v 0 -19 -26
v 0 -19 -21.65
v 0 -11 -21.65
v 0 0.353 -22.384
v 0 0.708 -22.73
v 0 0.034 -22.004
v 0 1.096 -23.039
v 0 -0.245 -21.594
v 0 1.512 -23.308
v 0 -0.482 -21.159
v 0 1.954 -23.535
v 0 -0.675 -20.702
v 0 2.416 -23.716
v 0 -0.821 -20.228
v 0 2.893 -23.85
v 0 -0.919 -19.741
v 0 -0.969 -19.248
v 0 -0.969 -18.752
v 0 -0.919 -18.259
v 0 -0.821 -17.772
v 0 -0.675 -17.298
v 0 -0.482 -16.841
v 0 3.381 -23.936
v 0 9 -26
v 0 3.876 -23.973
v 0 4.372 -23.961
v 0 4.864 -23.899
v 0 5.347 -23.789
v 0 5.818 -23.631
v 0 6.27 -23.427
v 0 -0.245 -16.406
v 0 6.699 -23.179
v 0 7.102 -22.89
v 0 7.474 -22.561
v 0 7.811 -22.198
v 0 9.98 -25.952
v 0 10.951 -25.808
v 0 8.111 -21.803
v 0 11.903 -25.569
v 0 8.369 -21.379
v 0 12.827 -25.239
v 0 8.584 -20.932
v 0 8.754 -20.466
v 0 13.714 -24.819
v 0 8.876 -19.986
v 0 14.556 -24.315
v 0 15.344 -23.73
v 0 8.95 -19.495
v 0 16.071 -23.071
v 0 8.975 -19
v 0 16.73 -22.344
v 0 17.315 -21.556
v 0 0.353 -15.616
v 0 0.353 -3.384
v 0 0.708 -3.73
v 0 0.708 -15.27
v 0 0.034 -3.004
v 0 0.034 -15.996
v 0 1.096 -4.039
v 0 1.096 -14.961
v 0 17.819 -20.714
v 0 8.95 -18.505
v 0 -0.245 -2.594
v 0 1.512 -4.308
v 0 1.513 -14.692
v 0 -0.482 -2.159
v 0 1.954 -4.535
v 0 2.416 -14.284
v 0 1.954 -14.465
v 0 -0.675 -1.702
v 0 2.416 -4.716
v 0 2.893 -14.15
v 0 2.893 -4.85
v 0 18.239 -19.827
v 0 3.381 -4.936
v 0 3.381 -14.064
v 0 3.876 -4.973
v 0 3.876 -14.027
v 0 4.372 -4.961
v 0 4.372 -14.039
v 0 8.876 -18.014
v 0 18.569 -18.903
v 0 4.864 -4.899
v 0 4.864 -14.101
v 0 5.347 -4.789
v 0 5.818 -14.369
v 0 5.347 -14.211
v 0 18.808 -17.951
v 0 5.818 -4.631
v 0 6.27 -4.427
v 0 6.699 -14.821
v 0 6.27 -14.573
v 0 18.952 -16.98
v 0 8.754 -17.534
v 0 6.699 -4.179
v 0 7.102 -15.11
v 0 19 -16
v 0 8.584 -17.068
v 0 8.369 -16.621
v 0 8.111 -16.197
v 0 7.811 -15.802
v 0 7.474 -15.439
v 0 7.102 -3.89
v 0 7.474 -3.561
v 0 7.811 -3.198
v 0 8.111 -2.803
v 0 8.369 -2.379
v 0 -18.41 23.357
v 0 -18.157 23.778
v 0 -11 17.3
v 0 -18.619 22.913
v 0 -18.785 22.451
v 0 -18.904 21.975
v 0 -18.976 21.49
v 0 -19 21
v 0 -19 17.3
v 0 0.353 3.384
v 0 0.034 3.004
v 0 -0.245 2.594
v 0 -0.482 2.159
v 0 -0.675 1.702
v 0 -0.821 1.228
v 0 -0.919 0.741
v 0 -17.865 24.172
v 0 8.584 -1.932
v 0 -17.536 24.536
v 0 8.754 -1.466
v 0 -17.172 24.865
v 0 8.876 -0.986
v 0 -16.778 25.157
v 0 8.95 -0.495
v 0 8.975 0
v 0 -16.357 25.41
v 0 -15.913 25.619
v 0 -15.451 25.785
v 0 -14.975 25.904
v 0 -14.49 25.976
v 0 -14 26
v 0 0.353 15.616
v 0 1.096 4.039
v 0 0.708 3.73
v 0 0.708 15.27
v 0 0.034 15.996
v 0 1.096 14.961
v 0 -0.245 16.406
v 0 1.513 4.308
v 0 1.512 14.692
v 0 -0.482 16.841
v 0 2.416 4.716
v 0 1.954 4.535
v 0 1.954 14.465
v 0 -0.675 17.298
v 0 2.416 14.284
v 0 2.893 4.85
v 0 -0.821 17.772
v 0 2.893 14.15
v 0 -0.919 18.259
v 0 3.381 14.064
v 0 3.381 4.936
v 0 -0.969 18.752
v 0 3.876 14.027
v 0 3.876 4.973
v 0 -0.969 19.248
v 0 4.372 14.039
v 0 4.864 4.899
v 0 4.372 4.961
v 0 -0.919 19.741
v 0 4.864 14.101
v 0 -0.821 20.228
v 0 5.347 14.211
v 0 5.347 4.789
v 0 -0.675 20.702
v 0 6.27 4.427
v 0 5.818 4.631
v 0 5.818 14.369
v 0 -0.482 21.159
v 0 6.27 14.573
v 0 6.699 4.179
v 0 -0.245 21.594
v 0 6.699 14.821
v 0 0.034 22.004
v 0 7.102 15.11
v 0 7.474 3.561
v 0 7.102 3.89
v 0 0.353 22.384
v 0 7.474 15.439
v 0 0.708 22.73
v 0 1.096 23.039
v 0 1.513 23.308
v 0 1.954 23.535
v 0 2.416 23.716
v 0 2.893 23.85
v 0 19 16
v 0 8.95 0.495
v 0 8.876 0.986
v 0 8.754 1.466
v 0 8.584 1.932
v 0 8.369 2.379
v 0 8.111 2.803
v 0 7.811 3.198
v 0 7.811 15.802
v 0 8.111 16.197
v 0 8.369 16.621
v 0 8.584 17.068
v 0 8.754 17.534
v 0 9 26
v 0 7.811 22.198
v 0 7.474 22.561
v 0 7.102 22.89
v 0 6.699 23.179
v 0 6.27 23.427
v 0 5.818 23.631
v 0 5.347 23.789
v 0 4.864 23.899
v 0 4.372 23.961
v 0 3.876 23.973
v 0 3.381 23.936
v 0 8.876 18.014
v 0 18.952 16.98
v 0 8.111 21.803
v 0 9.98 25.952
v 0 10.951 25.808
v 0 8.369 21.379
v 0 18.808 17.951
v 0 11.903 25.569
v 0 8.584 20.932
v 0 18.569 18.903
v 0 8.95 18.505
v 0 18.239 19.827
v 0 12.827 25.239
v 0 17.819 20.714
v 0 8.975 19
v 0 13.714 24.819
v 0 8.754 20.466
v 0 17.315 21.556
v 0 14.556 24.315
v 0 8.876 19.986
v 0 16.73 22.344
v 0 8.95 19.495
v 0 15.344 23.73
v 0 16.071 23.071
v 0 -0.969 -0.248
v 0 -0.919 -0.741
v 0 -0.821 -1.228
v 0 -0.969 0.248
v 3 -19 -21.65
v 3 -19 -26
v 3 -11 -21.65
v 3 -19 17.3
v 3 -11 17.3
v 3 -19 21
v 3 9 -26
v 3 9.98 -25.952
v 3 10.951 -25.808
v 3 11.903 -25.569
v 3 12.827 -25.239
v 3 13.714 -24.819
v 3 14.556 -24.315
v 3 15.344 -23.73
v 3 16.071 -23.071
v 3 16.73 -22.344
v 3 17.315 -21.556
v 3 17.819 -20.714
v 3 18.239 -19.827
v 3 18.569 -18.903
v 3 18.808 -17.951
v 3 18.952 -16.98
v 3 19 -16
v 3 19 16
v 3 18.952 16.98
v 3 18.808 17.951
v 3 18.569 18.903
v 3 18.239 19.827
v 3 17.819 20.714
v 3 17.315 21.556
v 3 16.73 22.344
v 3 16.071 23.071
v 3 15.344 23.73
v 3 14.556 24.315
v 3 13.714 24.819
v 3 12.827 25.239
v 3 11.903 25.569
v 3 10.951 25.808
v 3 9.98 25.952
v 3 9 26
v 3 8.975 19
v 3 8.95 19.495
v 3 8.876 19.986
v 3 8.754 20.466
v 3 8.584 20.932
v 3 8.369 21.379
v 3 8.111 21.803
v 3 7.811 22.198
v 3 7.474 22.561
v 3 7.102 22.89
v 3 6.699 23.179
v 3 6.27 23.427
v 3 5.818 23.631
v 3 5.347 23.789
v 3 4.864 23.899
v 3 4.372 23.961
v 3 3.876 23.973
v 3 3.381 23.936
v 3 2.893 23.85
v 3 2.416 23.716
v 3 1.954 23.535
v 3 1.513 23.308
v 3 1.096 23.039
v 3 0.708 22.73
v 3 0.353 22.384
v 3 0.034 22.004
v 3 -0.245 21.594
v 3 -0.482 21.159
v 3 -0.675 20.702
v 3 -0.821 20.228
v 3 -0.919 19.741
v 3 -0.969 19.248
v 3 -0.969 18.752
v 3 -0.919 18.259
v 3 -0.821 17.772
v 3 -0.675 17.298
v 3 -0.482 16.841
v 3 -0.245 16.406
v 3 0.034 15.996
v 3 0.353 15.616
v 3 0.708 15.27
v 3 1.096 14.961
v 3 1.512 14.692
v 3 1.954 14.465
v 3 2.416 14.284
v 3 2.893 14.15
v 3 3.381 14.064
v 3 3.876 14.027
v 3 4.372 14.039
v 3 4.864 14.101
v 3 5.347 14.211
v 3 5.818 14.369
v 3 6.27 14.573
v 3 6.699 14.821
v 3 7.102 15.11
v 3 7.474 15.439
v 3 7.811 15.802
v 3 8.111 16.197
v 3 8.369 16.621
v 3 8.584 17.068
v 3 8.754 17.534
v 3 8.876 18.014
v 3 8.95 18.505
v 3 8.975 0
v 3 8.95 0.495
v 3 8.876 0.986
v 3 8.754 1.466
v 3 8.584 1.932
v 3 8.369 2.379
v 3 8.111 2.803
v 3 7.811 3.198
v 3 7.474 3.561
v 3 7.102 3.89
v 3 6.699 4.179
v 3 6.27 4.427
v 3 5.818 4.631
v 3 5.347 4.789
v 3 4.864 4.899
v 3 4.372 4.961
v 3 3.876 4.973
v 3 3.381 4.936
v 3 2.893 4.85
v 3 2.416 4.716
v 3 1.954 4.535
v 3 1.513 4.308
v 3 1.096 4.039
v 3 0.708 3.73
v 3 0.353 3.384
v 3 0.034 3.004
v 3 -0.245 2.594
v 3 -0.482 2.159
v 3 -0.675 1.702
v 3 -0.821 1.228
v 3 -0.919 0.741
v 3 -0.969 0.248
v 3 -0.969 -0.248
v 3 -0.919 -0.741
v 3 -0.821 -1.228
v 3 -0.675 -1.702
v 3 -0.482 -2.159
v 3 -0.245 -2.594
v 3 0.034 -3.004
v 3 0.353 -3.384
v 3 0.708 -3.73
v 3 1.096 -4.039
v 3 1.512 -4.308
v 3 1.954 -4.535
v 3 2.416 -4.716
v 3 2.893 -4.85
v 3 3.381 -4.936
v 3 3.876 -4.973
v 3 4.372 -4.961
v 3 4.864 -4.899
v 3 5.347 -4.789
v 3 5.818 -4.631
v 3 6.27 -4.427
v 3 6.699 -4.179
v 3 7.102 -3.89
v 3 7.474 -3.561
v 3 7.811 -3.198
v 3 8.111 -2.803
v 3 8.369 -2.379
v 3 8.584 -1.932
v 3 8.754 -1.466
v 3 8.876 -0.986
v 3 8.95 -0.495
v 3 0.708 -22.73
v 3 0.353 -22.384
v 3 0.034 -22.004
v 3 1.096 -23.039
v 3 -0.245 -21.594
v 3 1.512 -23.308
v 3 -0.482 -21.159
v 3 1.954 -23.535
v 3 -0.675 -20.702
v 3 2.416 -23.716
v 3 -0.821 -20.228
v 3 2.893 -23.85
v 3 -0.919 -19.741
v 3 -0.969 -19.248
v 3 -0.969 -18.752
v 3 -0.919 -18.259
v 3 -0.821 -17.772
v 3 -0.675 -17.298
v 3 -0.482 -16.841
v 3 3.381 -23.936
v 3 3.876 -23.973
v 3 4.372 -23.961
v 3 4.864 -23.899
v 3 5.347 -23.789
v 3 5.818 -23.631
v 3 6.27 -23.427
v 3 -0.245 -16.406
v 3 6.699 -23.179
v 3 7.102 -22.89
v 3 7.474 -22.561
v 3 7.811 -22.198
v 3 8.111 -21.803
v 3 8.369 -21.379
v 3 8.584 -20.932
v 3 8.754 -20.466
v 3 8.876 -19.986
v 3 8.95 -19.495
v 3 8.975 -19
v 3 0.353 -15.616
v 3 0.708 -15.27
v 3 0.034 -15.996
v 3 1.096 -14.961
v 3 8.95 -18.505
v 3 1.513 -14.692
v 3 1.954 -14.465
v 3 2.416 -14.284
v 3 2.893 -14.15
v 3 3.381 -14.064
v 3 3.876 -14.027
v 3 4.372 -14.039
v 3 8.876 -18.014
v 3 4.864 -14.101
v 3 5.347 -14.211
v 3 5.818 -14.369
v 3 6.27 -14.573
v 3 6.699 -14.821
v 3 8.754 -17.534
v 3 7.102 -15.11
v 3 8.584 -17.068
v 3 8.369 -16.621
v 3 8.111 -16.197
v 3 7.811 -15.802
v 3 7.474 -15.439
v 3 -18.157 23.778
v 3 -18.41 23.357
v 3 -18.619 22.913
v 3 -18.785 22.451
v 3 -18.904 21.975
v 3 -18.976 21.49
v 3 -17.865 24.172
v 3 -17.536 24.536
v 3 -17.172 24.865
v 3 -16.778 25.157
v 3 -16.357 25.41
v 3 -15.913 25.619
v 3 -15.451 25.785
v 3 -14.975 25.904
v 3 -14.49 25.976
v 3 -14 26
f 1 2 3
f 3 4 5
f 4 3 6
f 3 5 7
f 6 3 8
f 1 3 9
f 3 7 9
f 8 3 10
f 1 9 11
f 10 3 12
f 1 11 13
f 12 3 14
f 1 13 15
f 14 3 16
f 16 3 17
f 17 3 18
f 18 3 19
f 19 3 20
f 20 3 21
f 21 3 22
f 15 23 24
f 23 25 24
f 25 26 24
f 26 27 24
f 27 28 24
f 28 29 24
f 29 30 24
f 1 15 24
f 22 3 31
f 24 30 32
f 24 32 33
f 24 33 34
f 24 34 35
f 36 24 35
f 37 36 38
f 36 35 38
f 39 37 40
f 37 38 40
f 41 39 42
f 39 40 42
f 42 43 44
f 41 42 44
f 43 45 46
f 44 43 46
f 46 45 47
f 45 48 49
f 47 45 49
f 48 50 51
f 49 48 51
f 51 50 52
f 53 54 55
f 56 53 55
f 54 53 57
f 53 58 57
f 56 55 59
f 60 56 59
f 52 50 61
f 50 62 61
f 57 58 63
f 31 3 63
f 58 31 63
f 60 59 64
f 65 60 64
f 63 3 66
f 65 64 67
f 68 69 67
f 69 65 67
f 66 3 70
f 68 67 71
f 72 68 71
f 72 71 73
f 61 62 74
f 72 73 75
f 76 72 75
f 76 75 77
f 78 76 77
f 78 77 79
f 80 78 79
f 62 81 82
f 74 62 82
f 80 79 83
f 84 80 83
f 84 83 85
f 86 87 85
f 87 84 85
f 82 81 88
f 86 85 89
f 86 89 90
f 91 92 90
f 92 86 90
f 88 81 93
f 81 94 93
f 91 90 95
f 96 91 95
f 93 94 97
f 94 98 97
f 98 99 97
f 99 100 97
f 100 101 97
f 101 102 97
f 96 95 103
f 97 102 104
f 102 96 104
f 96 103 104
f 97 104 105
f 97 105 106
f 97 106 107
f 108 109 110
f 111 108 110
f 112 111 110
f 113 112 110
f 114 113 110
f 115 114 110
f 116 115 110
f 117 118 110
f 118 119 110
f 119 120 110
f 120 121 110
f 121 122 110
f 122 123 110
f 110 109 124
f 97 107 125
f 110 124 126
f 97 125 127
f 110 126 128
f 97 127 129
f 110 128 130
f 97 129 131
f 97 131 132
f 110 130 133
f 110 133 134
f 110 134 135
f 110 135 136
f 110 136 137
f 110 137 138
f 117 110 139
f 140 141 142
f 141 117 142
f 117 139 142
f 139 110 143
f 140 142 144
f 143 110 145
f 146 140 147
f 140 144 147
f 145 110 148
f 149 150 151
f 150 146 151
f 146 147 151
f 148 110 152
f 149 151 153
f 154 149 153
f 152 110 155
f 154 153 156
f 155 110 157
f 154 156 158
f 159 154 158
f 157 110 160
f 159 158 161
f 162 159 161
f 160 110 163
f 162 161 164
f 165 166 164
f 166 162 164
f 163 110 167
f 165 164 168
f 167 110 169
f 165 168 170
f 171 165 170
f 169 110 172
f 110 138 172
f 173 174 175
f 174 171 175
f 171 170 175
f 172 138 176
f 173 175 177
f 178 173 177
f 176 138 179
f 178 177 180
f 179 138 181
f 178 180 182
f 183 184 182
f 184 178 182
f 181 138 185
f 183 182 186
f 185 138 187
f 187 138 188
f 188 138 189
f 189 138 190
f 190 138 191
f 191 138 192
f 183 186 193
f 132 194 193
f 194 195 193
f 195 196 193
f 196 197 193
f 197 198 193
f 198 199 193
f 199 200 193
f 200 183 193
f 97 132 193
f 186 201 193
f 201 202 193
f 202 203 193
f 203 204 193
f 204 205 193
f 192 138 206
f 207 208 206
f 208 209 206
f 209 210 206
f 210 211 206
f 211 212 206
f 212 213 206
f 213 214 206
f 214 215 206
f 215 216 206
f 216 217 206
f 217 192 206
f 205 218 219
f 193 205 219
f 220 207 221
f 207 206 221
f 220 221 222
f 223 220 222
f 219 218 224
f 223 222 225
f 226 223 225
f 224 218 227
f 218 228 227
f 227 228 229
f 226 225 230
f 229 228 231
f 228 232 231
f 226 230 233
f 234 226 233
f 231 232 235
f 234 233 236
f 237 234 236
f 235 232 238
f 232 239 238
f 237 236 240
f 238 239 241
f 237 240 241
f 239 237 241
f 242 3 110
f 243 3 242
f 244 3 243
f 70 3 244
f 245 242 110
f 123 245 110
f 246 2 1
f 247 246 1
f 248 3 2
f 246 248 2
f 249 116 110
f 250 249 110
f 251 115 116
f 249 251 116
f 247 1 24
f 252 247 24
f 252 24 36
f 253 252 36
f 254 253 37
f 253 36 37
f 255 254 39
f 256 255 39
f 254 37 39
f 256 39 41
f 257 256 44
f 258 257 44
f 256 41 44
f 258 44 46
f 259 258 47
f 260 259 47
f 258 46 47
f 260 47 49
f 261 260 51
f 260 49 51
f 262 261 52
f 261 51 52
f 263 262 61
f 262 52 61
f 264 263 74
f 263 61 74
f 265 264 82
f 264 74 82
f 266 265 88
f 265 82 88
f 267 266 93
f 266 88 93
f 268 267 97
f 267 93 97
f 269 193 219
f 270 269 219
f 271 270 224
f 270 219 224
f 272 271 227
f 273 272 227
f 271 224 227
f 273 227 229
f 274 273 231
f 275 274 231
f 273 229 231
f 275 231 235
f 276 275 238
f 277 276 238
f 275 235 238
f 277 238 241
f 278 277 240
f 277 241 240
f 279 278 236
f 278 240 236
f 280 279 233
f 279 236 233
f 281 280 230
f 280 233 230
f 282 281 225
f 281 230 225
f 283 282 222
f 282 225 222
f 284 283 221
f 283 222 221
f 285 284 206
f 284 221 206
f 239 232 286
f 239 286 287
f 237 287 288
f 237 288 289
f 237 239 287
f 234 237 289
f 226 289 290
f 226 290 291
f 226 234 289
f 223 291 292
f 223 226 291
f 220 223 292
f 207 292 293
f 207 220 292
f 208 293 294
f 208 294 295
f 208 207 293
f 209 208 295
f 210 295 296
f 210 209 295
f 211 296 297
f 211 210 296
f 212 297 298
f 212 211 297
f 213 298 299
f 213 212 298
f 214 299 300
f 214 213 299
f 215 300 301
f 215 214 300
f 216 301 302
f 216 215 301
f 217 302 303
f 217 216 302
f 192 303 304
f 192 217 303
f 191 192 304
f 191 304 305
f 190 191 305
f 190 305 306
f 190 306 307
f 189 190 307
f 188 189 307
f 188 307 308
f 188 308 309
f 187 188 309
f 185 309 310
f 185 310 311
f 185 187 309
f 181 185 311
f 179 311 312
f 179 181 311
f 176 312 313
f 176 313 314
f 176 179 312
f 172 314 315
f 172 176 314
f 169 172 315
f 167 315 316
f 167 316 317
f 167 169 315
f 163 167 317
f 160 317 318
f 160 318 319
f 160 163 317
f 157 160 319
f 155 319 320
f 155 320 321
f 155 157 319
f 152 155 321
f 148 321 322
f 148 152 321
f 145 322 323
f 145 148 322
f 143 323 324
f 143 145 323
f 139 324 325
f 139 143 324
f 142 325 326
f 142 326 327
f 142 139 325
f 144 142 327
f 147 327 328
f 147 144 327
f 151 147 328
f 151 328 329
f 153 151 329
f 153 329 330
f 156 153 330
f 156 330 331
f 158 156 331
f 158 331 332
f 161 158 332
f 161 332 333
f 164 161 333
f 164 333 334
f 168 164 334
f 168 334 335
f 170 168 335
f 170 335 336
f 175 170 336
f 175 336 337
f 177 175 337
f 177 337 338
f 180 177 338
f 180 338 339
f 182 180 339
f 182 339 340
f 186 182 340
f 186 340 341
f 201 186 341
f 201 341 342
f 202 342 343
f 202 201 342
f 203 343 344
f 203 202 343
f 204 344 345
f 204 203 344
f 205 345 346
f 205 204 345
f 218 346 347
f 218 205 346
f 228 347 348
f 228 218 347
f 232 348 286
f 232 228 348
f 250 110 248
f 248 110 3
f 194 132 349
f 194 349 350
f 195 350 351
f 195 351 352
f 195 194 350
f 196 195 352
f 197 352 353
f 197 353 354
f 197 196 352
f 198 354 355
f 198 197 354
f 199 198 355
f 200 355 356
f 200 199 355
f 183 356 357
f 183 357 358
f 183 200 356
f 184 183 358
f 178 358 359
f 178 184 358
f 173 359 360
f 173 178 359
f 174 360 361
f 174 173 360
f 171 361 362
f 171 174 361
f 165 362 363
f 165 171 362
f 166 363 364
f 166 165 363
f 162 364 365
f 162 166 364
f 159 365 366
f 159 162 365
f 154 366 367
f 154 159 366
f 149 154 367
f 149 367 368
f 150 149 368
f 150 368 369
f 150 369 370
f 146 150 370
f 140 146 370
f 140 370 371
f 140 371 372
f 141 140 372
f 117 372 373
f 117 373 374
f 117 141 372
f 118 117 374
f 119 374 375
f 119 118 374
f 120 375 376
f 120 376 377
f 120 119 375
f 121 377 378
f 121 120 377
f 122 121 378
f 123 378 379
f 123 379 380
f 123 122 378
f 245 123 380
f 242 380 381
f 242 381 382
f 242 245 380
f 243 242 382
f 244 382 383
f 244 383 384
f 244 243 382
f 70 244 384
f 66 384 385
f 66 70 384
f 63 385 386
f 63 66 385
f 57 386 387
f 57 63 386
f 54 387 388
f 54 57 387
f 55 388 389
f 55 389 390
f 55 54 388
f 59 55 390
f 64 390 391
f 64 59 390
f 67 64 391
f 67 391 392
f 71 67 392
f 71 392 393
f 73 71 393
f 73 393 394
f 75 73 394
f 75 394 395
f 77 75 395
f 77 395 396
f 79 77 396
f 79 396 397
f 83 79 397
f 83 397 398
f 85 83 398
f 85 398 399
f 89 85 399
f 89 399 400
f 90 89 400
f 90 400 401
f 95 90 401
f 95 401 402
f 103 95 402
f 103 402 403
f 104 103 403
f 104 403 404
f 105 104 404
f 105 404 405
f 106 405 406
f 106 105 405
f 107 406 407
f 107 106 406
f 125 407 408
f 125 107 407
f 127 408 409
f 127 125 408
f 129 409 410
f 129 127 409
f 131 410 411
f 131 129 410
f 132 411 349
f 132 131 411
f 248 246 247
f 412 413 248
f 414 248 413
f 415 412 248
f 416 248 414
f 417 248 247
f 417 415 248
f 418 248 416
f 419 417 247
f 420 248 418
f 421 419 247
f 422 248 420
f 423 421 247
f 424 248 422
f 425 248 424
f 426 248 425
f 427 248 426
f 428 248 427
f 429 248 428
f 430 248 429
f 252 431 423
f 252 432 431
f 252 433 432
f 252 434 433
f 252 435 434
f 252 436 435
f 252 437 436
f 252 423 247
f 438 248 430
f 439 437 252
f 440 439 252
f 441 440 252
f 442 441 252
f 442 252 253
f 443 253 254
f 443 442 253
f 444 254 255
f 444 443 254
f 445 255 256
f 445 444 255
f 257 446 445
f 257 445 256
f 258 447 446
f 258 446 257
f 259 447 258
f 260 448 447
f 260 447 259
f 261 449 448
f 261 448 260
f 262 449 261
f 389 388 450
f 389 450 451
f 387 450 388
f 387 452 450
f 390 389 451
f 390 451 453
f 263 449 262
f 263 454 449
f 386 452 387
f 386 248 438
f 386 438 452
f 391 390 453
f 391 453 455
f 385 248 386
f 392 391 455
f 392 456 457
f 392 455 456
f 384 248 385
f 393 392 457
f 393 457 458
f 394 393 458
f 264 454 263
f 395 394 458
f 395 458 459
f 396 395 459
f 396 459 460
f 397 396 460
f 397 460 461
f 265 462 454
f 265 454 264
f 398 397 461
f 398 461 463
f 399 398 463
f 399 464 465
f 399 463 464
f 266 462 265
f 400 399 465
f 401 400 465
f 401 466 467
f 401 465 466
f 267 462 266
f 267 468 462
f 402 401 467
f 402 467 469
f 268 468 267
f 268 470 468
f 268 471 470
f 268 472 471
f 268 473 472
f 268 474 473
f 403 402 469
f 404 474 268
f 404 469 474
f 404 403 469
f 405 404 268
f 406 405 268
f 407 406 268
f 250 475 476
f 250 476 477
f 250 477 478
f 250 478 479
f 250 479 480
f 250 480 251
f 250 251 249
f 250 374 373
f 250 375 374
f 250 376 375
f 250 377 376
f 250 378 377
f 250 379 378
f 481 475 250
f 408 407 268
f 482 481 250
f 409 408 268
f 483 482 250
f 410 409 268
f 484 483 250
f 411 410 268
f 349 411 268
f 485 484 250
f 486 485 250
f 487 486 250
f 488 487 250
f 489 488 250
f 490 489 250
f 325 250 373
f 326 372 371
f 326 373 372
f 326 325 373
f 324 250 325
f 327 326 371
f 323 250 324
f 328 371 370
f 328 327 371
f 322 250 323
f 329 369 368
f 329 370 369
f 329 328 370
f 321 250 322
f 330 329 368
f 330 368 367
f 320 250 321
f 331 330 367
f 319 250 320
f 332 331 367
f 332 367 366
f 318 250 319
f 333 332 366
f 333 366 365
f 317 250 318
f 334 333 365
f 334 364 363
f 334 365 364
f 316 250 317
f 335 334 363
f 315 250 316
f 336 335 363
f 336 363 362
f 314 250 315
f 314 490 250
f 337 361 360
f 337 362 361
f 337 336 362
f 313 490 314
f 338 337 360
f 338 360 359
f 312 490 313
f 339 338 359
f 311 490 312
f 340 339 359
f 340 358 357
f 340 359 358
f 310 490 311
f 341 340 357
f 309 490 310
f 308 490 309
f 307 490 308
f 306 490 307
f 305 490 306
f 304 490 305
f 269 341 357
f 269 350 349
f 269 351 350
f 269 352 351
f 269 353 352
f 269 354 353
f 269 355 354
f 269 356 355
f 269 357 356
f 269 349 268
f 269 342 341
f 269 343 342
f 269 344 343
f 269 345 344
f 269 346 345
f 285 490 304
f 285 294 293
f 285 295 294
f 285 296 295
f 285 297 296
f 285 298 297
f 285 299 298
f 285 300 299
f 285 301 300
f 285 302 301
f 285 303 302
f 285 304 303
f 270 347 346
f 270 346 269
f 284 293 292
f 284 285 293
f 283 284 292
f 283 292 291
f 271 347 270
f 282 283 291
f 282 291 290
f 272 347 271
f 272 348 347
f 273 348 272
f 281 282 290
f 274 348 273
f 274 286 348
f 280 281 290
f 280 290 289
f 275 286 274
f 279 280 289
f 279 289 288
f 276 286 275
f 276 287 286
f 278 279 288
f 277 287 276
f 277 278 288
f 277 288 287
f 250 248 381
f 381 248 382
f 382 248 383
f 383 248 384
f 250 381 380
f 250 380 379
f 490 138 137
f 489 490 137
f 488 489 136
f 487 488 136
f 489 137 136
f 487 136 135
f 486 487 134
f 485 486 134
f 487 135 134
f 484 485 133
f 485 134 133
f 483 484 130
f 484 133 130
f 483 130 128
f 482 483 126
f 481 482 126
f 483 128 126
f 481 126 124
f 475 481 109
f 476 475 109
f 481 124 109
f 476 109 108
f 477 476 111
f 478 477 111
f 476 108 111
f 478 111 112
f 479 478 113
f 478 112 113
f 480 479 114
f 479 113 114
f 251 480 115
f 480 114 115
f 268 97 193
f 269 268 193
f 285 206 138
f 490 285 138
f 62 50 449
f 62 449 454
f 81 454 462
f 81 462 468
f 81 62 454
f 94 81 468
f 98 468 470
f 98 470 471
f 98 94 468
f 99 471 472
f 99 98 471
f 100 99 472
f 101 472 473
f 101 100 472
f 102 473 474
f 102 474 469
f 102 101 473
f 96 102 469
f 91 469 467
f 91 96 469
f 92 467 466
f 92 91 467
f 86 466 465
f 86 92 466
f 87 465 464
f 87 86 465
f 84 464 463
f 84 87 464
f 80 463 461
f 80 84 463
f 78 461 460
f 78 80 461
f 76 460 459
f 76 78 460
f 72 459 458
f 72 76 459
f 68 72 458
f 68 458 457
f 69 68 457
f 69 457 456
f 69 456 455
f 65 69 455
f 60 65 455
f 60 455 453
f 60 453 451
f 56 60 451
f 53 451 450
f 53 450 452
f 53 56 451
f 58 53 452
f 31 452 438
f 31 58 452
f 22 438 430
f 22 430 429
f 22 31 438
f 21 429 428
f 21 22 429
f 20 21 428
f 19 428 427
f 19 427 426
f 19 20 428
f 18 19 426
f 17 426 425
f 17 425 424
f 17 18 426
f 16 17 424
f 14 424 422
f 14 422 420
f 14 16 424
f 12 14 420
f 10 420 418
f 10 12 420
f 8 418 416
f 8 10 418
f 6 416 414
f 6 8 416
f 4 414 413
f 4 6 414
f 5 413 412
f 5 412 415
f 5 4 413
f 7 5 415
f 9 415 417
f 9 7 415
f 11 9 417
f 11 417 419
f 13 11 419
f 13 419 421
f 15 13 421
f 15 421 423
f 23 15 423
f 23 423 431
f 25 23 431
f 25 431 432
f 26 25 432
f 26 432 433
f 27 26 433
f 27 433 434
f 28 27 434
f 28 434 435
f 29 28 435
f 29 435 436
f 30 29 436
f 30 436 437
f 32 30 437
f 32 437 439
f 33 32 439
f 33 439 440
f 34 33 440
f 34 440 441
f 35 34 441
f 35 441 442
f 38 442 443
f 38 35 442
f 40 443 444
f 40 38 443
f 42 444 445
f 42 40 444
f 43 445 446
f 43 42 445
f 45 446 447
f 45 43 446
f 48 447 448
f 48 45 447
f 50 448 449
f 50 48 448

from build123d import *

# Parameters (mm, degrees)
F0_R     = 4.975
F1_DEPTH = 3


with BuildPart() as f1:
    # F0 (on Right) → F1 (new body)
    with BuildSketch(Plane.YZ):
        with BuildLine():
            ThreePointArc((-14, 26), (-17.535534, 24.535534), (-19, 21))
            Line((-19, 21), (-19, 17.3))
            Line((-19, 17.3), (-11, 17.3))
            Line((-11, 17.3), (-11, -21.65))
            Line((-11, -21.65), (-19, -21.65))
            Line((-19, -21.65), (-19, -26))
            Line((-19, -26), (9, -26))
            ThreePointArc((9, -26), (16.071068, -23.071068), (19, -16))
            Line((19, -16), (19, 16))
            ThreePointArc((19, 16), (16.071068, 23.071068), (9, 26))
            Line((9, 26), (-14, 26))
        make_face()
        with Locations((4, -19)):
            Circle(F0_R, mode=Mode.SUBTRACT)
        with Locations((4, 0)):
            Circle(F0_R, mode=Mode.SUBTRACT)
        with Locations((4, 19)):
            Circle(F0_R, mode=Mode.SUBTRACT)
    extrude(amount=F1_DEPTH)


solid = f1.part
